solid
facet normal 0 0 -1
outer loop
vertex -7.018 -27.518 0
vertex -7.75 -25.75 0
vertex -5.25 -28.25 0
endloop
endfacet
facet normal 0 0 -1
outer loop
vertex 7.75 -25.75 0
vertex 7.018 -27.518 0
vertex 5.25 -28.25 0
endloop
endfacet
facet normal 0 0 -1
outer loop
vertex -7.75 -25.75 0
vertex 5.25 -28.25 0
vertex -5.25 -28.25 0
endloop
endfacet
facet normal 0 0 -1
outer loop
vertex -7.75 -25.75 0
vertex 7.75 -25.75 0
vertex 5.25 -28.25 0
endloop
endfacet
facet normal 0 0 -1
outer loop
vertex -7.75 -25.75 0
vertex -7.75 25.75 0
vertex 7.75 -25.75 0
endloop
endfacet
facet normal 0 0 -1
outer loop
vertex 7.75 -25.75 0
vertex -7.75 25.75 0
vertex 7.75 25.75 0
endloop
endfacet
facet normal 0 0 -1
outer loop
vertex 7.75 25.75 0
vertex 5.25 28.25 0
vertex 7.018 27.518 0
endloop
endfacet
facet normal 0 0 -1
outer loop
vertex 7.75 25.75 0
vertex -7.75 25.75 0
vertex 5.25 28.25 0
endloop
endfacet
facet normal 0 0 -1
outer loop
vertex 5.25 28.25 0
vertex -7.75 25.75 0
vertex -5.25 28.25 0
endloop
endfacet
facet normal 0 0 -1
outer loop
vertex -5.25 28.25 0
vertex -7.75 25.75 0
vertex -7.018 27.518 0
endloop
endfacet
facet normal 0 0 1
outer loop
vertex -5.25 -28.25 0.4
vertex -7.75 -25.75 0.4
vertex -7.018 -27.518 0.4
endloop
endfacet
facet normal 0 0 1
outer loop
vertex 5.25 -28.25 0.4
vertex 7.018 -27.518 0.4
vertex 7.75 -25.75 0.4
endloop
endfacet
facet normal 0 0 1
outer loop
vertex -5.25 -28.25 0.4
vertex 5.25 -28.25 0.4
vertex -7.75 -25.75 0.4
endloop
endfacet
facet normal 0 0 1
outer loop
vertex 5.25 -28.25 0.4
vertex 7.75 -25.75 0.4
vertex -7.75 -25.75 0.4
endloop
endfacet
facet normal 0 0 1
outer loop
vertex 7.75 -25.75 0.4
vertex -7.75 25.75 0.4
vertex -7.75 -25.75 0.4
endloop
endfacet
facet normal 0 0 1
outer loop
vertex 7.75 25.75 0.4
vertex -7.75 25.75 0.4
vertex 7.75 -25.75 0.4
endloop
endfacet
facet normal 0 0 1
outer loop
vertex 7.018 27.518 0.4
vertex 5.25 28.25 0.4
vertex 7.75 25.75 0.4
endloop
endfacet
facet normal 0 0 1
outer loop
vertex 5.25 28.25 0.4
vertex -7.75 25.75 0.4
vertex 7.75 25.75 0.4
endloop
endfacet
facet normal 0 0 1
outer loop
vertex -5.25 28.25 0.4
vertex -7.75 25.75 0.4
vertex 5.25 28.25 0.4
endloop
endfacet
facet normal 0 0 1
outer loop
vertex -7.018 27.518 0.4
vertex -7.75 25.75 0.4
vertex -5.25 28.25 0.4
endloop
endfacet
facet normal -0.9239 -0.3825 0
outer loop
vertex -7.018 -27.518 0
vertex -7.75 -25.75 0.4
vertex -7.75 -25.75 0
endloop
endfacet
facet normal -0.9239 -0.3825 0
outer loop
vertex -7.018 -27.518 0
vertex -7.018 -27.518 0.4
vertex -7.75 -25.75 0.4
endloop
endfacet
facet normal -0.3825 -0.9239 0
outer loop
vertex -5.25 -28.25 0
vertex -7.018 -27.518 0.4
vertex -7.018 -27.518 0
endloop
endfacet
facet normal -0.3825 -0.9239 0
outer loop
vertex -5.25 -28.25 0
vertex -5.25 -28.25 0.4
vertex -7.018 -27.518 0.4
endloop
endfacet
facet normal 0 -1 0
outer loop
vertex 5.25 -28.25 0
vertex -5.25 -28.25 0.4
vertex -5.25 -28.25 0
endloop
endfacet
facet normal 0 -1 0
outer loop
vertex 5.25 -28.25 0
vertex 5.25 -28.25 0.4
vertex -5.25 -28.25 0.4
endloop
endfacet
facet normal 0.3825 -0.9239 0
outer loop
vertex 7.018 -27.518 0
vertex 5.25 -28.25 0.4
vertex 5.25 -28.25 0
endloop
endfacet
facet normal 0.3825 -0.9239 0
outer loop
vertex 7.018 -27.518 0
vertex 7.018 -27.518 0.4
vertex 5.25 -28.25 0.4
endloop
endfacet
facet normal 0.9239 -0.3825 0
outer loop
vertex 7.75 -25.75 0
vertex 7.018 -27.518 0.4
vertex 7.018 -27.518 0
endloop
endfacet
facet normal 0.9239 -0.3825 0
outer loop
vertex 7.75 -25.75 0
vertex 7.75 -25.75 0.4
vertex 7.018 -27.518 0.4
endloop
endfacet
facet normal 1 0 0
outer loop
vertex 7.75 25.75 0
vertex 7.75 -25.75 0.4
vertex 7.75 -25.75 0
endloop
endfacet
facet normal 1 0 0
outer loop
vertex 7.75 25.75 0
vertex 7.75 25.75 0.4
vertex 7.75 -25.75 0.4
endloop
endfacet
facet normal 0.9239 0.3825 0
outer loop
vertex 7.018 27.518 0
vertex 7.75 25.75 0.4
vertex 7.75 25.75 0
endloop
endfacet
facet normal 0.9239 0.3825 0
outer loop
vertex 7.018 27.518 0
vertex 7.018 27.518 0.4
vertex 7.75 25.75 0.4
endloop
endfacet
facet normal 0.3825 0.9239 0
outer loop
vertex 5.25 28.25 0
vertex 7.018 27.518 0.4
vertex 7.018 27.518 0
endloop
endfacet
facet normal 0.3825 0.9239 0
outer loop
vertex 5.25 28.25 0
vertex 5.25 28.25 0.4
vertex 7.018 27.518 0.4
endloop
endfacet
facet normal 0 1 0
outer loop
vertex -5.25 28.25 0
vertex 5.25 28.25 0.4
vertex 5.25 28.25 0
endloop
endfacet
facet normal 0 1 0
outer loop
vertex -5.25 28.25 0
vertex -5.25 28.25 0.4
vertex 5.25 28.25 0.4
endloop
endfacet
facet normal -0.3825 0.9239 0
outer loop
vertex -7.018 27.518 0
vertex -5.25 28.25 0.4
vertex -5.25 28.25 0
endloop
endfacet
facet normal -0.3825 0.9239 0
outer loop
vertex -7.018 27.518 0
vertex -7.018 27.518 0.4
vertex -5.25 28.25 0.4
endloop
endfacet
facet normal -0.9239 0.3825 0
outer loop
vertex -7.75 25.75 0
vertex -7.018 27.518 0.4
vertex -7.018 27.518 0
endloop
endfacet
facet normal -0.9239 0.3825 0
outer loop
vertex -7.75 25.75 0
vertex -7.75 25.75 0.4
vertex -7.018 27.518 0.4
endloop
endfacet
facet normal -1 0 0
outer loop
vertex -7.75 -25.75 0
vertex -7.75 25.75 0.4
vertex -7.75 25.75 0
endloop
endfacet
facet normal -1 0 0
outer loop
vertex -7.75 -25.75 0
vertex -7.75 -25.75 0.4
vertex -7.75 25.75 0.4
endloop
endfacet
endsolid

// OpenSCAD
bX = 13;
bY = 54;

holeX = 8;
holeY = 3.5;

dHoleY = 47;

roundedRect([bX, bY, 0.4], 2.5);
module roundedRect(size, radius)
{
x = size[0];
y = size[1];
z = size[2];

linear_extrude(height=z)
hull()
{
    // place 4 circles in the corners, with the given radius
    translate([(-x/2)+(radius/2), (-y/2)+(radius/2), 0])
    circle(r=radius);

    translate([(x/2)-(radius/2), (-y/2)+(radius/2), 0])
    circle(r=radius);

    translate([(-x/2)+(radius/2), (y/2)-(radius/2), 0])
    circle(r=radius);

    translate([(x/2)-(radius/2), (y/2)-(radius/2), 0])
    circle(r=radius);
}

}
